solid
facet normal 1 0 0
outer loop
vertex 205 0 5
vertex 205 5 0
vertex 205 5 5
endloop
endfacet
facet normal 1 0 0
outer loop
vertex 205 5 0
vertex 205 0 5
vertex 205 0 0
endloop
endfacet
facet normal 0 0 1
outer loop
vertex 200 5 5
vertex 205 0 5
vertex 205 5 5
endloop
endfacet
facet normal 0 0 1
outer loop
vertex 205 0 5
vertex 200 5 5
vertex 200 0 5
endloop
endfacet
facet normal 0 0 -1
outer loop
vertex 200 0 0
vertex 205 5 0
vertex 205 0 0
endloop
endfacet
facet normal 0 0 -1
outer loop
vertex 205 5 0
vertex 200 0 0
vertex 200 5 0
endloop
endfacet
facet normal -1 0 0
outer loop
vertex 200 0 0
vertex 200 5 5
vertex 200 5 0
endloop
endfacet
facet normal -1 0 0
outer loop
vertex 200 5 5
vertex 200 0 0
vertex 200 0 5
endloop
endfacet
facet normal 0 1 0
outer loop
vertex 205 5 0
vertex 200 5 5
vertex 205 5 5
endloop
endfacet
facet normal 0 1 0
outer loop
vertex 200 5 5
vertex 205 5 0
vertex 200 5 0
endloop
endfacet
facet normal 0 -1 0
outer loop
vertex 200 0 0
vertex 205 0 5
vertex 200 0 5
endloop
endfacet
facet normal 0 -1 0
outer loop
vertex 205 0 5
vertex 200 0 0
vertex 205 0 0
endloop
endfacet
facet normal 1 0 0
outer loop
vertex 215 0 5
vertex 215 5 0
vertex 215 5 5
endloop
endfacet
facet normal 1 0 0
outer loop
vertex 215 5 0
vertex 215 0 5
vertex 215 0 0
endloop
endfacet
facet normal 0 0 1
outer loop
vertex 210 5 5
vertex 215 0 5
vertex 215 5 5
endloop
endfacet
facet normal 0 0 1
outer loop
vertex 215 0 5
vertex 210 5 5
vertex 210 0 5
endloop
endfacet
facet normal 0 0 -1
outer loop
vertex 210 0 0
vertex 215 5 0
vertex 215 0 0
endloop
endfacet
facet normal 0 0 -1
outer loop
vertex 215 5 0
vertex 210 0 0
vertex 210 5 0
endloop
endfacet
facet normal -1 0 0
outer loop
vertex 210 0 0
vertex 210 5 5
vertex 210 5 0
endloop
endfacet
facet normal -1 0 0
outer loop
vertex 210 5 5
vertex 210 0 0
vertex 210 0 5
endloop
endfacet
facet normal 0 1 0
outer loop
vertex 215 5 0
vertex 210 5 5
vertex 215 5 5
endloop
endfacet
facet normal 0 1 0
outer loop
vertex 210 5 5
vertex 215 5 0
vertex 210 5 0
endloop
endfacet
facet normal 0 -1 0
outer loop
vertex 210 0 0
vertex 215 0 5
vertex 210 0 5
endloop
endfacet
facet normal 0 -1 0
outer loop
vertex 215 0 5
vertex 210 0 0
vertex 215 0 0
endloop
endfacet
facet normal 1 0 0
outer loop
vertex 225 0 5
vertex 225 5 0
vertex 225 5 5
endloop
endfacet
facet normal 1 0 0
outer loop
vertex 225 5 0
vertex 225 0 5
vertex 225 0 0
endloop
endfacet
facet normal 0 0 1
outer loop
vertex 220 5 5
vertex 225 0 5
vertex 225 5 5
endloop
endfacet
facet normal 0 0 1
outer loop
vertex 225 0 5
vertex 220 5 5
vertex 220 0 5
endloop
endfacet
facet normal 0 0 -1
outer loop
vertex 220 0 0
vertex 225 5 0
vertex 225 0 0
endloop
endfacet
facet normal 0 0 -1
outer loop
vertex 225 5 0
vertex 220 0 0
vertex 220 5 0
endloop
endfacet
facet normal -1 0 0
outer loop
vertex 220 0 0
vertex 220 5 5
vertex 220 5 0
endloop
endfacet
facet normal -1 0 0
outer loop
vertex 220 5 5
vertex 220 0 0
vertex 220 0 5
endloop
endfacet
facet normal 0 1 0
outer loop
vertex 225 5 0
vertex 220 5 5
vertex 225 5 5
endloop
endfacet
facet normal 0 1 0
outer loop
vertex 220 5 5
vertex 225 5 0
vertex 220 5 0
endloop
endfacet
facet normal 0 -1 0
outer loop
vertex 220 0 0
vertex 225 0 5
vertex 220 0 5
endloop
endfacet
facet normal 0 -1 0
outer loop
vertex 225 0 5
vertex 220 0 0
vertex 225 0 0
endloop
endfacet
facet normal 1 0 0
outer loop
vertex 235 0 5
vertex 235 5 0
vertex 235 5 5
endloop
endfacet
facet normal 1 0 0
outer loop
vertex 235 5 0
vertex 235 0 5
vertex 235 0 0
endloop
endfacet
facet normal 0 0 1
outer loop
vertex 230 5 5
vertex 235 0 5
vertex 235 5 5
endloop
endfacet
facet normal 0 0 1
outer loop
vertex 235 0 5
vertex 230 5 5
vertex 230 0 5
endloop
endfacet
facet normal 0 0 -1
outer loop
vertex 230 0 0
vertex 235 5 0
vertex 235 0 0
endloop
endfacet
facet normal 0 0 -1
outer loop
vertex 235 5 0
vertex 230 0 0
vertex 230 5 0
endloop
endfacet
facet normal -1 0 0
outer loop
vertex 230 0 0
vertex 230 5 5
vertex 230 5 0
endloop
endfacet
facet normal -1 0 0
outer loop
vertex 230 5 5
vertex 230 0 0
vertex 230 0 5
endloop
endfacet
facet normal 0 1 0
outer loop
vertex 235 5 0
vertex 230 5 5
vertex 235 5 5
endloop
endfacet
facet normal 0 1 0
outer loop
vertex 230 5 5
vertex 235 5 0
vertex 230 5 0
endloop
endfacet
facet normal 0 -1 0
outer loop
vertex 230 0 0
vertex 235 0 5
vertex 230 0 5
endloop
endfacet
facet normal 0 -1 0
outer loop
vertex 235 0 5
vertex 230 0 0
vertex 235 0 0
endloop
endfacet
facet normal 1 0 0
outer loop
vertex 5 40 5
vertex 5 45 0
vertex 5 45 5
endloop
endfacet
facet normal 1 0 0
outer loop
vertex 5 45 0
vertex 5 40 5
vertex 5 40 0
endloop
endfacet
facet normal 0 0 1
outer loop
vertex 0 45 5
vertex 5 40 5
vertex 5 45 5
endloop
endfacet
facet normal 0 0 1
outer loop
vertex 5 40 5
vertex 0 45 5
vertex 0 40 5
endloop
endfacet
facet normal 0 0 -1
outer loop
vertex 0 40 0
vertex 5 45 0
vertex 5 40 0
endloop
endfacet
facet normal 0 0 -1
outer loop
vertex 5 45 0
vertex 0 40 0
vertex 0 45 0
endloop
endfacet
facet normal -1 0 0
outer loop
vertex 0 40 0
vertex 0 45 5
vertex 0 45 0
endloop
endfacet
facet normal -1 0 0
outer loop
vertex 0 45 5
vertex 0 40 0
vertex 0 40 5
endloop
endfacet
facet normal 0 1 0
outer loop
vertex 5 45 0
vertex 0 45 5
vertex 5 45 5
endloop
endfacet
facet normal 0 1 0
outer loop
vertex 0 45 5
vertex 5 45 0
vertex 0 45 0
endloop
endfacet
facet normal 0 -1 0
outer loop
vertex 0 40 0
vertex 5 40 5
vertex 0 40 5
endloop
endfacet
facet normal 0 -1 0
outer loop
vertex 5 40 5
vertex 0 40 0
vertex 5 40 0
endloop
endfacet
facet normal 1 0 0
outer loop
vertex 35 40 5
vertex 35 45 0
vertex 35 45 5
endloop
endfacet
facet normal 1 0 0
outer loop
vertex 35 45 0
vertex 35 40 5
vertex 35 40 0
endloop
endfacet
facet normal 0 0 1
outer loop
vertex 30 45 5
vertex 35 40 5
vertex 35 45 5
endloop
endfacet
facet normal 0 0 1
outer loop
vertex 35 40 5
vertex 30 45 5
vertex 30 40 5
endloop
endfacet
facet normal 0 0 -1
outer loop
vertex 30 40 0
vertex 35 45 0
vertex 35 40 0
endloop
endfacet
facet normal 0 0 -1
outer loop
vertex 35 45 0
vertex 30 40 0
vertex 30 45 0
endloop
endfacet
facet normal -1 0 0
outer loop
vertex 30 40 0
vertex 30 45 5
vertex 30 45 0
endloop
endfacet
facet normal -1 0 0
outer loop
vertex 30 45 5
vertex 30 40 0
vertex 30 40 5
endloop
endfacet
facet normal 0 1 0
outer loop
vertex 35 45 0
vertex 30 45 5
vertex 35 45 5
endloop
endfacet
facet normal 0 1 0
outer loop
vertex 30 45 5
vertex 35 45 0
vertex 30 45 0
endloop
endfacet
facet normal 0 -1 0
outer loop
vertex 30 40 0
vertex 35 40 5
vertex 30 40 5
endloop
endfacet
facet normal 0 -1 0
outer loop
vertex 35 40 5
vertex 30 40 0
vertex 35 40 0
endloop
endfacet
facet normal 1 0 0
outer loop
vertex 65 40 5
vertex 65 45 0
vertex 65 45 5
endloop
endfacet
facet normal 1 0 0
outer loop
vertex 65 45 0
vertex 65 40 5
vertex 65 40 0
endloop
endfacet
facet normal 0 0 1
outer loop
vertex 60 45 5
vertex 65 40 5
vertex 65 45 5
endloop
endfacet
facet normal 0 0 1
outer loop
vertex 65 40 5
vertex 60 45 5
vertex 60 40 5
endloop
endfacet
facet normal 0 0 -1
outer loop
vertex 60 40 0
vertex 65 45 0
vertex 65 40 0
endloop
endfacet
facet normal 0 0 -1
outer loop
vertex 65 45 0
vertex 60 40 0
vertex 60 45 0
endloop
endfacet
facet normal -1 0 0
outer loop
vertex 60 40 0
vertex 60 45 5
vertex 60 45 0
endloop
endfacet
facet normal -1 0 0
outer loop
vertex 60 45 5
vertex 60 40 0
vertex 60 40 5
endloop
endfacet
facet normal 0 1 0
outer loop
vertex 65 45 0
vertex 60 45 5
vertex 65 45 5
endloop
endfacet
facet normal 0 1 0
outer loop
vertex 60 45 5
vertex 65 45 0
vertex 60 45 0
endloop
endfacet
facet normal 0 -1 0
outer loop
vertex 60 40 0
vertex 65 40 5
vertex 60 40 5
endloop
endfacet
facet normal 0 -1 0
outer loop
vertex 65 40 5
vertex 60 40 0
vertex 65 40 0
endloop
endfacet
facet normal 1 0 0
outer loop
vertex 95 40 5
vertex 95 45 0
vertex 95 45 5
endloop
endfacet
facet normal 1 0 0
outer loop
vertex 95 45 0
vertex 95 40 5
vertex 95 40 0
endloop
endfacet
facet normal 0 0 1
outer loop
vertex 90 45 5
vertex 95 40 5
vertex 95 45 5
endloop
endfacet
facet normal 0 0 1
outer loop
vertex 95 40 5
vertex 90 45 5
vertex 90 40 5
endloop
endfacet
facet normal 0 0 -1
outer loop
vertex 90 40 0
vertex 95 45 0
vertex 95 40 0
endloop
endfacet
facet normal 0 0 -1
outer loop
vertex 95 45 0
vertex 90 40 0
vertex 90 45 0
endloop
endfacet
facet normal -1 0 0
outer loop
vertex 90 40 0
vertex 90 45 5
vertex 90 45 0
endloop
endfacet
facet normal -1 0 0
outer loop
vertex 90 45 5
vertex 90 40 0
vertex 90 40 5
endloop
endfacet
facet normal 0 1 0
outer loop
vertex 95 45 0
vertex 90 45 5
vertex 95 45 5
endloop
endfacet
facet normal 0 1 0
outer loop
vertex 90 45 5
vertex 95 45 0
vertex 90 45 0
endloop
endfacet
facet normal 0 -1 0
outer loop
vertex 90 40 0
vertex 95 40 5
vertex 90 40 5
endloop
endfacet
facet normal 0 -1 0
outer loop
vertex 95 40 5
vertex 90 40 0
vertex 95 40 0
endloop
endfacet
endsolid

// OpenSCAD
// How many items a fractional-step range has, at the two step values that
// separate every plausible counting rule from OpenSCAD's.
//
// WHAT IT WOULD CATCH. One extra or one missing item at the end of a patterned
// row — an extra boss, or a missing hole, easy to miss on a preview and
// impossible to miss in the material. `scad.ts` used to accumulate (`x += step`)
// with a 1e-12 slack and ran the first loop below FIVE times where OpenSCAD runs
// it four.
//
// 🔴 THE TWO LOOPS FAIL IN OPPOSITE DIRECTIONS, WHICH IS THE WHOLE POINT.
// `(end-begin)/step` lands just under an integer for most decimal steps, and the
// rounding rule decides whether the last item exists. Measured against OpenSCAD
// 2026.08.07: 1 ulp below an integer always rounds UP, 2 ulps below never does.
//   · `[1 : 0.05 : 1.2]` is 2 ulps below 4 and OpenSCAD emits **4** items
//   · `[0 : 0.1 : 0.3]`  is 1 ulp  below 3 and OpenSCAD emits **4** items
// A plain `Math.trunc` gets the second wrong; a plain `Math.round` gets the
// first wrong; an absolute or relative epsilon fitted to one breaks the other.
// One loop alone cannot tell those apart, so both are here.
//
// WHY IT WAS CHOSEN. The corpus's only stepped range was `[0 : 2.5 : 10]`, whose
// quotient is exactly 4 — the one value at which every counting rule agrees. So
// `control_for_step` looked like coverage of fractional steps and could not see
// this defect. `hardware/cad/` writes real non-exact steps (`[0.4:0.2:0.8]`,
// `[0:0.01:1+EPSILON]`).
//
// Decidability: 5 mm cubes at 10 mm pitch in the first row and 30 mm pitch in
// the second, the rows 40 mm apart in y, so no two bounding boxes can touch —
// including the spurious fifth cube a wrong rule would add at x = 240.
//
// PLANTED AND WATCHED RED (throwaway copy, openscad 2026.08.07):
//   · `Math.trunc(span)` without the one-ulp nudge  -> DIVERGES
//   · `Math.round(span)`                            -> DIVERGES
for (i = [1 : 0.05 : 1.2]) translate([i * 200, 0, 0]) cube([5, 5, 5]);
for (j = [0 : 0.1 : 0.3]) translate([j * 300, 40, 0]) cube([5, 5, 5]);
